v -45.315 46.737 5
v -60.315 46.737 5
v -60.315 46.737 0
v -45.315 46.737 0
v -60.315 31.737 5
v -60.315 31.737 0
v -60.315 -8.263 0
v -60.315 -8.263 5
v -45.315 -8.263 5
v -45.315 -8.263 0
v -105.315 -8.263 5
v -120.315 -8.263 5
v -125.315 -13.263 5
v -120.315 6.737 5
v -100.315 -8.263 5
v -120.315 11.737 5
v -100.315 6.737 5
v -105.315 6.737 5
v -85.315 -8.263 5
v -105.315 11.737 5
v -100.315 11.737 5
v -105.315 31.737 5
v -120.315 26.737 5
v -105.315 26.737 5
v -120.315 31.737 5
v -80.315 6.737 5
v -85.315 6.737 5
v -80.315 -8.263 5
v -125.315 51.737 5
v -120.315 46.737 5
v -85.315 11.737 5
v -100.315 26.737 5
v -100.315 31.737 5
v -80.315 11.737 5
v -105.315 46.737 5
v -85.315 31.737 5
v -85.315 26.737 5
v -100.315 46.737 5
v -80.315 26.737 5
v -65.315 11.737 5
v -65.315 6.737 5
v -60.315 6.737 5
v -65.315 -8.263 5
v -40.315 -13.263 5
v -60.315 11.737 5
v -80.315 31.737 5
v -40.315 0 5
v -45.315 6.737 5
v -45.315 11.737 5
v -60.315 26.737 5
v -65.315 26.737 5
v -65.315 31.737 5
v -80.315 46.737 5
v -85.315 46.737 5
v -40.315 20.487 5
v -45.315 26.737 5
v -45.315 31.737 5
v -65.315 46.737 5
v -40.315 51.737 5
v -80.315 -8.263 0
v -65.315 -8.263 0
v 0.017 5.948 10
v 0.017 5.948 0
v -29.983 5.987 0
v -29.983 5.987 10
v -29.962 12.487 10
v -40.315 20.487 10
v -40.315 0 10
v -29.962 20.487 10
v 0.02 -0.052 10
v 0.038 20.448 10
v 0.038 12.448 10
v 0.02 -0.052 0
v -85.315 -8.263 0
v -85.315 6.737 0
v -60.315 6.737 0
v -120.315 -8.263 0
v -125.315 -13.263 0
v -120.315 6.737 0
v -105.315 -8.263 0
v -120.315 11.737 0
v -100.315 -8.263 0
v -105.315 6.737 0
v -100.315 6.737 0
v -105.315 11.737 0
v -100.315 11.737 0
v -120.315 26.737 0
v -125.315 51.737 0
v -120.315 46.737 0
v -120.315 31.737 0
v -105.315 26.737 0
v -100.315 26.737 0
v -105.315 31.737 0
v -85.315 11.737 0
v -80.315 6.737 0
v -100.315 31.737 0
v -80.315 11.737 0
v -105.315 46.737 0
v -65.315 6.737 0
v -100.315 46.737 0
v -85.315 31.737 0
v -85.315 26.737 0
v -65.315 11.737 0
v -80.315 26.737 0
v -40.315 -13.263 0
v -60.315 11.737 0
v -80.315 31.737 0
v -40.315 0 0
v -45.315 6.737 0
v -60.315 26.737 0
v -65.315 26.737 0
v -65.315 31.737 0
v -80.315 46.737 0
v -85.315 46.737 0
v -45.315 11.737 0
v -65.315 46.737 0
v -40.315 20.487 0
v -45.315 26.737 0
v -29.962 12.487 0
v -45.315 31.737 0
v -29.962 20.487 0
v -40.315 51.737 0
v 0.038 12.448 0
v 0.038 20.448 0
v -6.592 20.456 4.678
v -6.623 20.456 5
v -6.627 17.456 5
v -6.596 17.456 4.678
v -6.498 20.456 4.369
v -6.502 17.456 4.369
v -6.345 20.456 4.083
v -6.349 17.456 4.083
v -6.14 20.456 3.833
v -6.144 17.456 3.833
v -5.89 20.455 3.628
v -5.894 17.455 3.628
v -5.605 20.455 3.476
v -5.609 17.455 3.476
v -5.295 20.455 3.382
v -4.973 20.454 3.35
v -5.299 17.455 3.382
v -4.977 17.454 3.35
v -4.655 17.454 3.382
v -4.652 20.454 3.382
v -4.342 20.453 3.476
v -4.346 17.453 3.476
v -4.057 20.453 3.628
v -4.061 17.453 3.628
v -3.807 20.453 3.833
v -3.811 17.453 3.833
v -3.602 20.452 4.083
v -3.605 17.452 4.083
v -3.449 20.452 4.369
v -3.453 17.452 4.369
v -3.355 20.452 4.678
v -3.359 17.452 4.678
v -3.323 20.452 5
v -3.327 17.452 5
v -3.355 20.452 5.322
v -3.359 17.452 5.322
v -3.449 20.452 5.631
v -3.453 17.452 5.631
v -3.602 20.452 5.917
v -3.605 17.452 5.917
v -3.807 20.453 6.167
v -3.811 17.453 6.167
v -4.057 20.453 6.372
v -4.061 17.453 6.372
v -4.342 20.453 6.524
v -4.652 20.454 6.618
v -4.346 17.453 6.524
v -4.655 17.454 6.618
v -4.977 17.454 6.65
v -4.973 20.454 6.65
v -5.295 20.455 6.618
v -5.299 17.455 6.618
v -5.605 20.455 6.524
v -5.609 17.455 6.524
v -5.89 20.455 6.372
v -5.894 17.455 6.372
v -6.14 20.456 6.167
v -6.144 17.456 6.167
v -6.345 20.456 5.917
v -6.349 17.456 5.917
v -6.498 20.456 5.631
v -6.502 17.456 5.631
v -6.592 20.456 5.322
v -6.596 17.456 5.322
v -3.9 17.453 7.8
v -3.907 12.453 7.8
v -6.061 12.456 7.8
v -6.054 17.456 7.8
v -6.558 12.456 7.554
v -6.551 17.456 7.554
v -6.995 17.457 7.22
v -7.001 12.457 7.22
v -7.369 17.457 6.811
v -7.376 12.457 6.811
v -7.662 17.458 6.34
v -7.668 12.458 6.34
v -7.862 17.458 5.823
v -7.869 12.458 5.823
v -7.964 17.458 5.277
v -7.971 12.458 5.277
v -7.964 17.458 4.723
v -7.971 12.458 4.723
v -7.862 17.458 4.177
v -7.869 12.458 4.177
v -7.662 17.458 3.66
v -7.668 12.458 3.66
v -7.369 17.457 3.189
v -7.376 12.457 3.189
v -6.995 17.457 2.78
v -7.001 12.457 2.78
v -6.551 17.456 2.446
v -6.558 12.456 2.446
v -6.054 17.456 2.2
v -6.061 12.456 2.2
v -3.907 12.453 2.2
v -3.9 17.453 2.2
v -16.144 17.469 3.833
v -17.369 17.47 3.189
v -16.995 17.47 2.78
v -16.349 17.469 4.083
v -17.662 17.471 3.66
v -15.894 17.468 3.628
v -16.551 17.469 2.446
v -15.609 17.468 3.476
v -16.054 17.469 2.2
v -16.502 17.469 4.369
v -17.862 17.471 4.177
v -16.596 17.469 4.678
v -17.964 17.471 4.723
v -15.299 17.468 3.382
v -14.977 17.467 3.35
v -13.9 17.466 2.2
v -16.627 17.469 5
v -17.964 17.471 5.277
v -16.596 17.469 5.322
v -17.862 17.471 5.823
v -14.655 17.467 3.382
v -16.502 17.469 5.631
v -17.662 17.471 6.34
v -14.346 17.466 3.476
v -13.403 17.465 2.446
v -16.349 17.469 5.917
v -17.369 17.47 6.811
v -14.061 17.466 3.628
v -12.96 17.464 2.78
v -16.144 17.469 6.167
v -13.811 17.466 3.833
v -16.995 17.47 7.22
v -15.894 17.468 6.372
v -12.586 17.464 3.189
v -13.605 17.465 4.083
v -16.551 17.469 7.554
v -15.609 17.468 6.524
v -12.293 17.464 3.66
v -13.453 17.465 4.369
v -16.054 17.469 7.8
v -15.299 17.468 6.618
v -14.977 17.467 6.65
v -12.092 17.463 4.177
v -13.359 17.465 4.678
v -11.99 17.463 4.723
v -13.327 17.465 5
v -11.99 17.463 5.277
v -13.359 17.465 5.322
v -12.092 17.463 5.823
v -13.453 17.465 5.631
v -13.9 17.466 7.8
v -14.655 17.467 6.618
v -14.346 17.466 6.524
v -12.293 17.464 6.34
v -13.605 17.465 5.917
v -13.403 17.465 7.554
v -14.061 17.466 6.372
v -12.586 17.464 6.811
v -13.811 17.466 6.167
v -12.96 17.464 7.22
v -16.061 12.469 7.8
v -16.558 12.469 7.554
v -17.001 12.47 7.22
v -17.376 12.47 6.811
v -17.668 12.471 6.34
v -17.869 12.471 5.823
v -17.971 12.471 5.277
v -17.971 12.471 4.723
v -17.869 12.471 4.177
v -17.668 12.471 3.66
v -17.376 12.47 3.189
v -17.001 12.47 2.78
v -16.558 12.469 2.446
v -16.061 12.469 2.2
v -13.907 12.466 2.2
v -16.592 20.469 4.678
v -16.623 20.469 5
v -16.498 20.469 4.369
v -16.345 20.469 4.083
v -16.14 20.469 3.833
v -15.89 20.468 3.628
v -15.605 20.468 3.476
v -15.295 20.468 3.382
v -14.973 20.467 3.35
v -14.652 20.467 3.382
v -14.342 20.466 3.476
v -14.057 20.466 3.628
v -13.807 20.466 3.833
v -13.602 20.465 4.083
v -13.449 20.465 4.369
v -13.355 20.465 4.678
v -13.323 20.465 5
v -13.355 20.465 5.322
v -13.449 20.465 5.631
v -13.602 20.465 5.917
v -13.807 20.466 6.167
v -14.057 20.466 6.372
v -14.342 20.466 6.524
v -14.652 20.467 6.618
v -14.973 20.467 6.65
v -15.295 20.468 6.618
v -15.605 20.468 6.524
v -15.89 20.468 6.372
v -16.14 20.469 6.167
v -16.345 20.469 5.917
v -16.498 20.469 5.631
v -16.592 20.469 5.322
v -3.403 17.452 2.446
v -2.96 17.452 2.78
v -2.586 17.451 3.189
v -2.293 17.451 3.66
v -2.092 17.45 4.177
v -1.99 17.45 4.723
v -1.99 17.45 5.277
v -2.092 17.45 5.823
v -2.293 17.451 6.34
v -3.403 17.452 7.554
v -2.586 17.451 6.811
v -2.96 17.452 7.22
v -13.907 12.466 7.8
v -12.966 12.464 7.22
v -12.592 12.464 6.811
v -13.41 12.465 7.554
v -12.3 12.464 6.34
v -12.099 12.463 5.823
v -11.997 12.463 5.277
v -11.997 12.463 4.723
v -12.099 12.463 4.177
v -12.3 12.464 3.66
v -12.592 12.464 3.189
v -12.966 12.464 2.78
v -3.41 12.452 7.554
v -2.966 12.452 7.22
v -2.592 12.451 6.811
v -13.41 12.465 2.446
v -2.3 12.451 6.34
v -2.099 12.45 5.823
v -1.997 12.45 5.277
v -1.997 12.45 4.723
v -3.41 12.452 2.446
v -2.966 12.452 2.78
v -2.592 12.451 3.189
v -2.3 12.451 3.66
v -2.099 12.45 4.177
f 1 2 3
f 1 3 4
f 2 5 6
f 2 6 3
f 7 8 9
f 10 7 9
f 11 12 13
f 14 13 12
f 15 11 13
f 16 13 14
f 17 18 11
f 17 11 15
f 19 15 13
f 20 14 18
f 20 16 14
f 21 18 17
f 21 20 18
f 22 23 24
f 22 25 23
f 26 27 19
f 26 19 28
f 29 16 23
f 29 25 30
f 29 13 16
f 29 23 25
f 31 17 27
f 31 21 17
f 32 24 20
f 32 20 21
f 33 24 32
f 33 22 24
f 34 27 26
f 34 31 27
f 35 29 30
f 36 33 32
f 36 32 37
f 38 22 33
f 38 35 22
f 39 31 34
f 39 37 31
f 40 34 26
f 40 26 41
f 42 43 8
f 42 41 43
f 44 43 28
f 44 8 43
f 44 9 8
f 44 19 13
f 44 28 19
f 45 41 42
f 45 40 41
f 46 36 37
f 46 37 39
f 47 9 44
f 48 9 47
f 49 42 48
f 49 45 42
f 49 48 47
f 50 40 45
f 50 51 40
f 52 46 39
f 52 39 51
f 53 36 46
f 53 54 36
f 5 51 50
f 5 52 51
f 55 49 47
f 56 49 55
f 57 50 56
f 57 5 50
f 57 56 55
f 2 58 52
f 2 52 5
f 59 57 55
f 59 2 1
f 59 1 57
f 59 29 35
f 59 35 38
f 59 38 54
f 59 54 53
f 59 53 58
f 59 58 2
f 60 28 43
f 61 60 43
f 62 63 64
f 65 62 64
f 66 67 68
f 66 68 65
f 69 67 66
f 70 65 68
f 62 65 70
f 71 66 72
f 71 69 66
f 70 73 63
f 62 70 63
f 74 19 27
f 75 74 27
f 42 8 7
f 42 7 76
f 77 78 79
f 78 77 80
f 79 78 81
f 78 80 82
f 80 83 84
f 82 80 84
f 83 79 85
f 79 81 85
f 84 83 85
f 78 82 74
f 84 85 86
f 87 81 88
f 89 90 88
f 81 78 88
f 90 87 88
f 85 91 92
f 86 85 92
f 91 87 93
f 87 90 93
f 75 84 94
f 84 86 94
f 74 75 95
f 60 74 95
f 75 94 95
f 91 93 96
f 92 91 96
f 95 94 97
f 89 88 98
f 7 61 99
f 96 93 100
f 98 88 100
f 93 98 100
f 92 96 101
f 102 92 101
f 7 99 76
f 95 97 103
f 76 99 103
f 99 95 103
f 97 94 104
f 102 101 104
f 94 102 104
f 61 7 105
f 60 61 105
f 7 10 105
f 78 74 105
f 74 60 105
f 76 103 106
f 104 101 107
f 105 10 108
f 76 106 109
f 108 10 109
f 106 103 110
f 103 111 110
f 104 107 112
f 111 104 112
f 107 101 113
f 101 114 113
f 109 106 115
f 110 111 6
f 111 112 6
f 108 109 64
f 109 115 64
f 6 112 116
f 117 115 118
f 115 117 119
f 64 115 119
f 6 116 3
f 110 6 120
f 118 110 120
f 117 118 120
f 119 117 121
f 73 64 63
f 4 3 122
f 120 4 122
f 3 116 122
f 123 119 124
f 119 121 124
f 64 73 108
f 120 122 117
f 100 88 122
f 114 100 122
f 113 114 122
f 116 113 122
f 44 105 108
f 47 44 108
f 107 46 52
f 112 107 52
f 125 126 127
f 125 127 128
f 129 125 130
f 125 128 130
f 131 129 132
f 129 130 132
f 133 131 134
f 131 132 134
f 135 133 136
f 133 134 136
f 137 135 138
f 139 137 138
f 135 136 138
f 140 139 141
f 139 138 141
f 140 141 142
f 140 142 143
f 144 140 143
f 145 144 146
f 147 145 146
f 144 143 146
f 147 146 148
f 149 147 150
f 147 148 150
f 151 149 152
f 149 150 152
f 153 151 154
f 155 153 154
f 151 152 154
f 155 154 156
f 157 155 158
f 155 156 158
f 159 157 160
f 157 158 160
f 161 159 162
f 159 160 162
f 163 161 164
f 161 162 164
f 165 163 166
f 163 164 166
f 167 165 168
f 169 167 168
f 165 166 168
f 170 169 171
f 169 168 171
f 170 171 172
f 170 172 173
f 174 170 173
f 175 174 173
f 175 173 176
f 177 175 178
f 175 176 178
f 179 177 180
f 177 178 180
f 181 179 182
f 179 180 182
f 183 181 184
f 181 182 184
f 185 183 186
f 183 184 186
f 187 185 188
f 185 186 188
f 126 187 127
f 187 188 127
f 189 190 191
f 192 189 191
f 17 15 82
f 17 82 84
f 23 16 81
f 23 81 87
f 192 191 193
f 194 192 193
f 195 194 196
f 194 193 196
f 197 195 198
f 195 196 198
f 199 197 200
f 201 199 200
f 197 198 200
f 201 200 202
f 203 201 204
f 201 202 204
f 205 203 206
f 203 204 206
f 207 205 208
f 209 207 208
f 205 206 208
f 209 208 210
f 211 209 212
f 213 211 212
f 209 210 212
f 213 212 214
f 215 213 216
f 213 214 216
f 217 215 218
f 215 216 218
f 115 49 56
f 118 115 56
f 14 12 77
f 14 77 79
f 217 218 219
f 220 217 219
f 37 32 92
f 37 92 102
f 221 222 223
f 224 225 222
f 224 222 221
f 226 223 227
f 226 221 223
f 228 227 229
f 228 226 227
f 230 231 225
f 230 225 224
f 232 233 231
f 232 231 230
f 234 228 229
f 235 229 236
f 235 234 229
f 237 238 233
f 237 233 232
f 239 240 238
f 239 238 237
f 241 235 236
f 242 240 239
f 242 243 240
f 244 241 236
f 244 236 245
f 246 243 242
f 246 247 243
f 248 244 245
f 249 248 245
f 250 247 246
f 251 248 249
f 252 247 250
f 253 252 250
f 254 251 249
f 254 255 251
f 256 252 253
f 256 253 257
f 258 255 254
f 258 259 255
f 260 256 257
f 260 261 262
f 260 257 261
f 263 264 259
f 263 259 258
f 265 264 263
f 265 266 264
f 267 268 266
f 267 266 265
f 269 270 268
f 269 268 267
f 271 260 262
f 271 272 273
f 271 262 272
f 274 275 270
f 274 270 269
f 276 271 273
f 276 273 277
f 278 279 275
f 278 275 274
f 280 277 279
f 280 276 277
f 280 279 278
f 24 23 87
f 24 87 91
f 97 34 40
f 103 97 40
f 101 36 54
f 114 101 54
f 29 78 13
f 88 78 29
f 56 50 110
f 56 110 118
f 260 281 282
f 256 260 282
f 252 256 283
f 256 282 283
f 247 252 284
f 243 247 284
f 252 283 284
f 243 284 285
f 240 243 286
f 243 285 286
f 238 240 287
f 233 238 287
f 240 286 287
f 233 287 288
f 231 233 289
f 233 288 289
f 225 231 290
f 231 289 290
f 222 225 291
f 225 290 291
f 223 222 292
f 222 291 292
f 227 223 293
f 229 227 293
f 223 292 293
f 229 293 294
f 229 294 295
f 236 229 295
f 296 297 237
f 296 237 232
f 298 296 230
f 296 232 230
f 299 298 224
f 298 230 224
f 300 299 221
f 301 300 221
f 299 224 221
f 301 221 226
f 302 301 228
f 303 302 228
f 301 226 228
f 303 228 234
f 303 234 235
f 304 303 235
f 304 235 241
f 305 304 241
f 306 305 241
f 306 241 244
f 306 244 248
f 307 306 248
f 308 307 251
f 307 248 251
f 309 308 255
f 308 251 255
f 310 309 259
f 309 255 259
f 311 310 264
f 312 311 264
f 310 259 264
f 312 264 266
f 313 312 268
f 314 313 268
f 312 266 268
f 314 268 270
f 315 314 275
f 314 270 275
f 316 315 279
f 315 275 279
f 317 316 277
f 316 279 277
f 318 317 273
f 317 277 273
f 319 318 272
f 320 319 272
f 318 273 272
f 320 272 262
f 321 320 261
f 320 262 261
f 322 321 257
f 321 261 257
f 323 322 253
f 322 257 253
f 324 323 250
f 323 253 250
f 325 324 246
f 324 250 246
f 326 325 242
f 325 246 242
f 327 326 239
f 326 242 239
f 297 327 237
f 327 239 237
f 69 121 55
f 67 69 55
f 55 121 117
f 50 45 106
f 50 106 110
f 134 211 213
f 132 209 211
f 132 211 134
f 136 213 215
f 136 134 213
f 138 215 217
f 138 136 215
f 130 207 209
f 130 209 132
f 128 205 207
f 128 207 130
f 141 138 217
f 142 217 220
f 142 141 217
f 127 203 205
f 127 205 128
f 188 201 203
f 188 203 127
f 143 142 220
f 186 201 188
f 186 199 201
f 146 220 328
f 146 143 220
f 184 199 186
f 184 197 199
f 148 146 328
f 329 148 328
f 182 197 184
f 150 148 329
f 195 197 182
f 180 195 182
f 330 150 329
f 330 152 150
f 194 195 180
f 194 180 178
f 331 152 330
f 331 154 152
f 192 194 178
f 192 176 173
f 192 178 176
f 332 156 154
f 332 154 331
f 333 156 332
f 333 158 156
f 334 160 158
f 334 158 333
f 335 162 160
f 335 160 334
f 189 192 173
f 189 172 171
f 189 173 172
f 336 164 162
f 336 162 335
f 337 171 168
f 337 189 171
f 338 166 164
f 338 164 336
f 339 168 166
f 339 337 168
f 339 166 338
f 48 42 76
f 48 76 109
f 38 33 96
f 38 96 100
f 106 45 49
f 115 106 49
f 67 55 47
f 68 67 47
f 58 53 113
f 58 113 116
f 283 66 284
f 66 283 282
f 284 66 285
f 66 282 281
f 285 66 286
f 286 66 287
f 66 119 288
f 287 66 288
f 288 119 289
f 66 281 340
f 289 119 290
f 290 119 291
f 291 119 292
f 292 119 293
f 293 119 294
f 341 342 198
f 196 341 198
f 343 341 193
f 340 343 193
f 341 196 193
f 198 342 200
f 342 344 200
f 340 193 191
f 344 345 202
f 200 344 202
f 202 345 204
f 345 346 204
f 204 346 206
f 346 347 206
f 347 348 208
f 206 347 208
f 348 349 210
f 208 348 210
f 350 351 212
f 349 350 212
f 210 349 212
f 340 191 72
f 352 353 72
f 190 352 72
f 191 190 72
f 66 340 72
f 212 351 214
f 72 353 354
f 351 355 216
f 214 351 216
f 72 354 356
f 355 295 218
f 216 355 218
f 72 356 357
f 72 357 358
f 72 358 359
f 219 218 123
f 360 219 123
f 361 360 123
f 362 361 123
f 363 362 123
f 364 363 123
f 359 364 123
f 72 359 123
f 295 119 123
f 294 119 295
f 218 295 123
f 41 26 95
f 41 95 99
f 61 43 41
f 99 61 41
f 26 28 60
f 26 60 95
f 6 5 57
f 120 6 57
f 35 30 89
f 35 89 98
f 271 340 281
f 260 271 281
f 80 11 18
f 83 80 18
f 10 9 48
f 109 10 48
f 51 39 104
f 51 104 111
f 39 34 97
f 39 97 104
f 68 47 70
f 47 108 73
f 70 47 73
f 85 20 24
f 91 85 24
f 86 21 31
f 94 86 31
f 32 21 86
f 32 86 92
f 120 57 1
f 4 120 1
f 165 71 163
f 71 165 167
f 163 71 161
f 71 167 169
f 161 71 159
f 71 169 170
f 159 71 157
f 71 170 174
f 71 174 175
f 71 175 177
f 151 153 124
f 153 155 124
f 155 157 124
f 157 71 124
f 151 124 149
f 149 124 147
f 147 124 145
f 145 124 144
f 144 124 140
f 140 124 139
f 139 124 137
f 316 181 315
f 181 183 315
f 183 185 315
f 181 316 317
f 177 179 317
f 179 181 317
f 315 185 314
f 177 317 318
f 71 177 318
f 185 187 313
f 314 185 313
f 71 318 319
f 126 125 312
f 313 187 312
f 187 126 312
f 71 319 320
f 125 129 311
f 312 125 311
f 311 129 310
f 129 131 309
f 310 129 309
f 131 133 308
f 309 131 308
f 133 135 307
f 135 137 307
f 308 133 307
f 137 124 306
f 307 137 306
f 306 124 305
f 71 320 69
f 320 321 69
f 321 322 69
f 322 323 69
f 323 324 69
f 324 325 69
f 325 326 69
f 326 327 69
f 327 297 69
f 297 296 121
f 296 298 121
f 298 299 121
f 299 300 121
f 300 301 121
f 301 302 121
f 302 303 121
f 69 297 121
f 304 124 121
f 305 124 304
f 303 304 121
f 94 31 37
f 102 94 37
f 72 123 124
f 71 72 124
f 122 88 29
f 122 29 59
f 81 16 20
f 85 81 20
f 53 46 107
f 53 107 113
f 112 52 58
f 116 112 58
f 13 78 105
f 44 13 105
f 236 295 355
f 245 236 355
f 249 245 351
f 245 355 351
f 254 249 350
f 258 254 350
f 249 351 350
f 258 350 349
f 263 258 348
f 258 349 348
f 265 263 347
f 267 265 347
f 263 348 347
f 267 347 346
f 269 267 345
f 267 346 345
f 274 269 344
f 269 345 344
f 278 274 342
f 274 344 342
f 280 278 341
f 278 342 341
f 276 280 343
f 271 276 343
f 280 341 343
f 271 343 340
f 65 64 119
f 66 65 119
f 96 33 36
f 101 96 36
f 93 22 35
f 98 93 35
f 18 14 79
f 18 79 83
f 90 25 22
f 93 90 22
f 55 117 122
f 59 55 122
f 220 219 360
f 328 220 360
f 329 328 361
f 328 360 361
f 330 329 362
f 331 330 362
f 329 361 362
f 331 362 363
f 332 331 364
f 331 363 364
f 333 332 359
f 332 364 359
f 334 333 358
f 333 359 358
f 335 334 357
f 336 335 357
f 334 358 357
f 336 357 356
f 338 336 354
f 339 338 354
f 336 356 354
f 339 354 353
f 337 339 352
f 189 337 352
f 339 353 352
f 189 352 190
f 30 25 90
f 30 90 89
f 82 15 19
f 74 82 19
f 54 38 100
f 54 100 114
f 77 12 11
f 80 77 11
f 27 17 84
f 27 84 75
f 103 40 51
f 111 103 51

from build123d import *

# Parameters (mm, degrees)
EXTRUDE_1_DEPTH             = 10
HOLE_WIZARD_M4_1_D          = 3.3
HOLE_WIZARD_M4_1_DEPTH      = 7.999993258
CUT_EXTRUDE_1_DEPTH         = 5
SKETCH_6_W                  = 85
SKETCH_6_H                  = 65
EXTRUDE_2_DEPTH             = 5
SKETCH_7_W                  = 15
SKETCH_7_H                  = 15
CUT_EXTRUDE_2_DEPTH         = 5
PATTERN_LINEAR_1_COUNT      = 4
PATTERN_LINEAR_1_PITCH      = 20
PATTERN_LINEAR_1_COUNT_DIR2 = 3
PATTERN_LINEAR_1_PITCH_DIR2 = 20


with BuildPart() as part:
    # 草图1 → 凸台-拉伸1 (new body)
    with BuildSketch(Plane.XY):
        Polygon((0.020144186, -0.052366179), (0.016918395, 5.947632954), (-29.983056322, 5.986581065), (-29.962376808, 12.486559695), (0.03759791, 12.447611584), (0.03759791, 20.447611584), (-29.962376808, 20.486559695), (-40.315163894, 20.486559695), (-40.315163894, 0), align=None)
    extrude(amount=EXTRUDE_1_DEPTH)

    # M4 螺纹孔的螺纹孔钻头1
    with Locations(Plane(origin=(0.026546569, 20.447625932, 0), x_dir=(0.999999157, -0.00129827, 0), z_dir=(0.00129827, 0.999999157, 0))):
        with Locations((-15, -5), (-5, -5)):
            Hole(HOLE_WIZARD_M4_1_D / 2, depth=HOLE_WIZARD_M4_1_DEPTH)

    # 草图5 → 切除-拉伸1 (cut)
    with BuildSketch(Plane(origin=(0.016160415, 12.447639416, 0), x_dir=(0.999999157, -0.00129827, 0), z_dir=(-0.00129827, -0.999999157, 0))):
        with BuildLine():
            Line((-16.077032961, 2.2), (-13.922967039, 2.2))
            ThreePointArc((-13.922967039, 2.2), (-12, 5), (-13.922967039, 7.8))
            Line((-13.922967039, 7.8), (-16.077032961, 7.8))
            ThreePointArc((-16.077032961, 7.8), (-18, 5), (-16.077032961, 2.2))
        make_face()
        with BuildLine():
            Line((-6.077032961, 2.2), (-3.922967039, 2.2))
            ThreePointArc((-3.922967039, 2.2), (-2, 5), (-3.922967039, 7.8))
            Line((-3.922967039, 7.8), (-6.077032961, 7.8))
            ThreePointArc((-6.077032961, 7.8), (-8, 5), (-6.077032961, 2.2))
        make_face()
    extrude(amount=-CUT_EXTRUDE_1_DEPTH, mode=Mode.SUBTRACT)

    # 草图6 → 凸台-拉伸2 (add)
    with BuildSketch(Plane.XY):
        with Locations((-82.815163894, 19.23657038)):
            Rectangle(SKETCH_6_W, SKETCH_6_H)
    extrude(amount=EXTRUDE_2_DEPTH)

    # 草图7 → 切除-拉伸2 (cut)
    with BuildSketch(Plane.XY.offset(5)):
        with Locations((-112.815163894, 39.23657038)):
            Rectangle(SKETCH_7_W, SKETCH_7_H)
    cut_extrude_2 = extrude(amount=-CUT_EXTRUDE_2_DEPTH, mode=Mode.SUBTRACT)

    # 阵列(线性)1: Cut-Extrude 2 4 × 3
    with Locations(*[(i * PATTERN_LINEAR_1_PITCH, -j * PATTERN_LINEAR_1_PITCH_DIR2, 0) for i in range(PATTERN_LINEAR_1_COUNT) for j in range(PATTERN_LINEAR_1_COUNT_DIR2) if (i, j) != (0, 0)]):
        add(cut_extrude_2, mode=Mode.SUBTRACT)


solid = part.part
